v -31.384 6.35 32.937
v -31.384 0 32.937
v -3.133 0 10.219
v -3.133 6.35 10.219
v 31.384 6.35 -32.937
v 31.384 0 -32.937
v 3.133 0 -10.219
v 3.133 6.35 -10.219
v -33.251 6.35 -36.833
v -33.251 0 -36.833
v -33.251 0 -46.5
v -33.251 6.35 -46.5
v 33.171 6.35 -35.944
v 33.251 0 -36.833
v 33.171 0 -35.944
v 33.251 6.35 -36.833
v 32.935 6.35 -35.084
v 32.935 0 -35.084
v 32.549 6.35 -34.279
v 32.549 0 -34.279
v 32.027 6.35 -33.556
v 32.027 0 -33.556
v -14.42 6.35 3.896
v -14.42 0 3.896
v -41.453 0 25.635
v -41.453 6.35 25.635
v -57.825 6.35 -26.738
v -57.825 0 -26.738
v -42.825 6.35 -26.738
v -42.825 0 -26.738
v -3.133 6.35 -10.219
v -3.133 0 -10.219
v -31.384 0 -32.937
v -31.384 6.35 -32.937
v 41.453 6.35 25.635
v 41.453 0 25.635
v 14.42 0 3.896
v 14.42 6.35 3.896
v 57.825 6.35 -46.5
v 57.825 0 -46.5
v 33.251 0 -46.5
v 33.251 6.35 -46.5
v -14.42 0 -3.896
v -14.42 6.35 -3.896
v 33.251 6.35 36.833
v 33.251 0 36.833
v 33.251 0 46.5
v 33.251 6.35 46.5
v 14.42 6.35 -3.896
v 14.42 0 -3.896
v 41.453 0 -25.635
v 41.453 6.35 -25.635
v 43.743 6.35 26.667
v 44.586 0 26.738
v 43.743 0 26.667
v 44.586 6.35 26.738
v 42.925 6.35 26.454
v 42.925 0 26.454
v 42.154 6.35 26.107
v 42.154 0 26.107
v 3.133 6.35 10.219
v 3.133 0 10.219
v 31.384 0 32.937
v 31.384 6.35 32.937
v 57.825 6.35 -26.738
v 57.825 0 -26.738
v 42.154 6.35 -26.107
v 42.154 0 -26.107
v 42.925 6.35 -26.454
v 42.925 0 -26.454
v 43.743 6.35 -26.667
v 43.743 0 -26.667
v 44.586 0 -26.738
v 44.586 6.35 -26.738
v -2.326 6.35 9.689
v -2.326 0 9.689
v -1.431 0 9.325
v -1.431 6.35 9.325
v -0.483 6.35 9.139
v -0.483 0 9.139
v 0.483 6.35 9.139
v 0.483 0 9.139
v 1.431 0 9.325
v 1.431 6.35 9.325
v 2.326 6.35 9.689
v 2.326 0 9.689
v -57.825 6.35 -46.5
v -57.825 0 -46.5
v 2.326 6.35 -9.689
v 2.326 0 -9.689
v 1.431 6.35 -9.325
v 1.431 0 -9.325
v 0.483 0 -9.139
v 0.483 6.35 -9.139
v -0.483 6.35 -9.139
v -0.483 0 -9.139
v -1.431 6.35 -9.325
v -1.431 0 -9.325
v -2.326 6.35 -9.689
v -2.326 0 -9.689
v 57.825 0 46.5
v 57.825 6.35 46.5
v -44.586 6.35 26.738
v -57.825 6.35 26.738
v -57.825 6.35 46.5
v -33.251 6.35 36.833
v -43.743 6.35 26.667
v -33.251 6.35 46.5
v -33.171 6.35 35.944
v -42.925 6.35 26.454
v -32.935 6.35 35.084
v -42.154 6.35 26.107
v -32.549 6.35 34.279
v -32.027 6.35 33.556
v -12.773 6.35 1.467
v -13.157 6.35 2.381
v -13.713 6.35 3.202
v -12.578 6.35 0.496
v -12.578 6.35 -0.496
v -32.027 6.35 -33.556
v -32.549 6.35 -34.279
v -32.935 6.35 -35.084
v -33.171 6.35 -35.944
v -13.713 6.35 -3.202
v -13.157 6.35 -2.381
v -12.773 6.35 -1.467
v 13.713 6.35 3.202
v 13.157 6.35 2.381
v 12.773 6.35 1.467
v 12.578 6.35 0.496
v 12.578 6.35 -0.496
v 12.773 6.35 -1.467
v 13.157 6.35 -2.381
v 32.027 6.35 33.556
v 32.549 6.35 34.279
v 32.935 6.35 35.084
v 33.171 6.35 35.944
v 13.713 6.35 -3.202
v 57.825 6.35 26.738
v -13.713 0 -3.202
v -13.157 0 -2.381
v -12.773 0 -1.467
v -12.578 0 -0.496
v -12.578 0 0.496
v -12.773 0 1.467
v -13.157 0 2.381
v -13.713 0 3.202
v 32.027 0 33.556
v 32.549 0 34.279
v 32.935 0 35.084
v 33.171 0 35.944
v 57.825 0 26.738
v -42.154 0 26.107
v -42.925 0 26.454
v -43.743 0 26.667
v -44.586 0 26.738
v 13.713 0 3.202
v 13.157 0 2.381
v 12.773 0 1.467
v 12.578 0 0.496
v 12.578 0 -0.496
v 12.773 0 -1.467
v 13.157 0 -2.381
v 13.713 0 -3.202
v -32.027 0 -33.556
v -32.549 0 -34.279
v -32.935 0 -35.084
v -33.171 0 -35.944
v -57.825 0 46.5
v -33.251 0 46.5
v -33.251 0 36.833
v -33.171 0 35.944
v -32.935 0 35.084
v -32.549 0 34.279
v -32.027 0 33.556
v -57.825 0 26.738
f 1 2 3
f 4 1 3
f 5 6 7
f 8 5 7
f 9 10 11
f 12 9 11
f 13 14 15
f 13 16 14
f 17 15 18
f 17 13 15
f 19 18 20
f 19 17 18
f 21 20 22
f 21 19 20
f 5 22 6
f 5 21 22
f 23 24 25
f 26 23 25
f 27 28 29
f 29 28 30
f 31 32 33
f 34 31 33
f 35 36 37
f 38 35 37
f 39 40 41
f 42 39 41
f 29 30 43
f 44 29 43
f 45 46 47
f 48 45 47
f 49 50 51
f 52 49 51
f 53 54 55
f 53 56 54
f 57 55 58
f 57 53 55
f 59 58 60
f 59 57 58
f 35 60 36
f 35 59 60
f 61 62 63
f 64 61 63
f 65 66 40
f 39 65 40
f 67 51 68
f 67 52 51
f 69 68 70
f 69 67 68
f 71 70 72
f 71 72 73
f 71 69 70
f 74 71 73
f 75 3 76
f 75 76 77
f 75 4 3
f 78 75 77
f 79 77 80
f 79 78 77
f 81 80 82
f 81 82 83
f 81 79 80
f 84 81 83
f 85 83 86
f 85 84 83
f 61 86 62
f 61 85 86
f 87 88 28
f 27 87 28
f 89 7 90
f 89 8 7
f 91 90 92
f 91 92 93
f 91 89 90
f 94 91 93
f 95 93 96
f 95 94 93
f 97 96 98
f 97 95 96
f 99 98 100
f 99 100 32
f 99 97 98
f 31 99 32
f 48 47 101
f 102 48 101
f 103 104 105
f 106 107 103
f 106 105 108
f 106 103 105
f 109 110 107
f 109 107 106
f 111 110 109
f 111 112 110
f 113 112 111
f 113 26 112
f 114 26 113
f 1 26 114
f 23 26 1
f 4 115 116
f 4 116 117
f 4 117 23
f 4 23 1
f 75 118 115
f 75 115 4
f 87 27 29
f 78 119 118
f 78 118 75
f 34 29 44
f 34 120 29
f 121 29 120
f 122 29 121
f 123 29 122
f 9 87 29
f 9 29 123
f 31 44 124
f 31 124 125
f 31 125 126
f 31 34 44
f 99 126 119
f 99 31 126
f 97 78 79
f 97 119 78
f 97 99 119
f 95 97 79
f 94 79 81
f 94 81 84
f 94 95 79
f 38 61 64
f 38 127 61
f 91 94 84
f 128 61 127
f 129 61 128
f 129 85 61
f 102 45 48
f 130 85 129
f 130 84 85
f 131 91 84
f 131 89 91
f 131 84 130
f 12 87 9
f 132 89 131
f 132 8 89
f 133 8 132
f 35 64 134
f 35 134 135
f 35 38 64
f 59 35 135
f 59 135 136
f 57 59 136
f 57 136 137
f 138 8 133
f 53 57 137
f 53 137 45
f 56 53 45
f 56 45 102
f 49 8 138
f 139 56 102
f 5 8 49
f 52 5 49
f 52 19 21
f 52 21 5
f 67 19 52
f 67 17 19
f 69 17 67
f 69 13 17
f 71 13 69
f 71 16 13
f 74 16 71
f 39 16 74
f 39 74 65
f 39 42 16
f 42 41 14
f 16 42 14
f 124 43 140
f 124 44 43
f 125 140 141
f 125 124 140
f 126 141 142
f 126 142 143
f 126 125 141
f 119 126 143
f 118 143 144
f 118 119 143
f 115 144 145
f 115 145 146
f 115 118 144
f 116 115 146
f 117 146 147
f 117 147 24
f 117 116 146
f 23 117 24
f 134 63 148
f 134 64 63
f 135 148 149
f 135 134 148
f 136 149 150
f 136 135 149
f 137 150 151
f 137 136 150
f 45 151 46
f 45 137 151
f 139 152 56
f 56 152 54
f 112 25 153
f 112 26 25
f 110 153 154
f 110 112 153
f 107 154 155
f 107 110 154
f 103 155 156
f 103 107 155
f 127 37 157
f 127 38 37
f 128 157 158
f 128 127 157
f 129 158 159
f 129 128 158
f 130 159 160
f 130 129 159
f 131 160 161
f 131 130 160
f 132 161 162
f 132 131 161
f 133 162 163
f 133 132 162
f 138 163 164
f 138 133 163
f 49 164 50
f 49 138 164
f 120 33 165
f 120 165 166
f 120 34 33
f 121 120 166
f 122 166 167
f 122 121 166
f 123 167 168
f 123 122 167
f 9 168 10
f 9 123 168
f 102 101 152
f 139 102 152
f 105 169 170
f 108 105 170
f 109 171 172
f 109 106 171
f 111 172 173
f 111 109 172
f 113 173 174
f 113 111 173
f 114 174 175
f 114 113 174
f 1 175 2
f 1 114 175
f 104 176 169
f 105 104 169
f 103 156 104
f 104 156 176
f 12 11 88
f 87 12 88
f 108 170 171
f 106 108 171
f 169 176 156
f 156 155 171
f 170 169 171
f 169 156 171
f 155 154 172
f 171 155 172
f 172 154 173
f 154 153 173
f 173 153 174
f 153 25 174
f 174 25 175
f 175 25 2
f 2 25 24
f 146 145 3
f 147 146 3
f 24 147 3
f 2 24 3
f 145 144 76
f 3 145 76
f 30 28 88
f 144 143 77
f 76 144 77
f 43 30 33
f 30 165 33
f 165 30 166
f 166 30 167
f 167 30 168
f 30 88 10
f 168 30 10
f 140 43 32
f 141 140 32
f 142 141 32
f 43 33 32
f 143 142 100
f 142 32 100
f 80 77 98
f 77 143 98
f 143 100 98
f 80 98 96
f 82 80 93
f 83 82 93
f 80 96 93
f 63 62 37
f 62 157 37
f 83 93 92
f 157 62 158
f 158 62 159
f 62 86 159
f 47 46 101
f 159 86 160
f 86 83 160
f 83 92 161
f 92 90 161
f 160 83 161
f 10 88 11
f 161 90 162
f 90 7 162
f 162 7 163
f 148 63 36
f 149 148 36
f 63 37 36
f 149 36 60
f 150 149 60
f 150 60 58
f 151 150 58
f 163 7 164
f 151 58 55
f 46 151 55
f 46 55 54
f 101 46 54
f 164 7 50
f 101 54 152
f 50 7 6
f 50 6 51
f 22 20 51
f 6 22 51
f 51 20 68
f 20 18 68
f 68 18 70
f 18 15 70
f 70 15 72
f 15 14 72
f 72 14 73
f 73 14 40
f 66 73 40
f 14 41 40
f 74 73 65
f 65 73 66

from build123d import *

# Parameters (mm, degrees)
BOSS_EXTRUDE1_DEPTH = 6.35
FILLET1_R           = 5


with BuildPart() as part:
    # Sketch1 → Boss-Extrude1 (new body)
    with BuildSketch(Plane(origin=(0, 0, 0), x_dir=(1, 0, 0), z_dir=(0, 1, 0))):
        Polygon((-57.825, 26.738412941), (-42.825, 26.738412941), (-9.574489714, 0), (-42.825, -26.738412941), (-57.825, -26.738412941), (-57.825, -46.5), (-33.250510286, -46.5), (-33.250510286, -34.437743191), (0, -7.69933025), (33.250510286, -34.437743191), (33.250510286, -46.5), (57.825, -46.5), (57.825, -26.738412941), (42.825, -26.738412941), (9.574489714, 0), (42.825, 26.738412941), (57.825, 26.738412941), (57.825, 46.5), (33.250510286, 46.5), (33.250510286, 34.437743191), (0, 7.69933025), (-33.250510286, 34.437743191), (-33.250510286, 46.5), (-57.825, 46.5), align=None)
    extrude(amount=BOSS_EXTRUDE1_DEPTH)

    # Fillet1
    fillet1_edges = [part.edges().sort_by_distance(p)[0] for p in [
        (-33.250510286, 3.175, -34.437743191),
        (0, 3.175, -7.69933025),
        (33.250510286, 3.175, -34.437743191),
        (42.825, 3.175, -26.738412941),
        (9.574489714, 3.175, 0),
        (42.825, 3.175, 26.738412941),
        (33.250510286, 3.175, 34.437743191),
        (0, 3.175, 7.69933025),
        (-33.250510286, 3.175, 34.437743191),
        (-42.825, 3.175, 26.738412941),
        (-9.574489714, 3.175, 0),
    ]]
    fillet(fillet1_edges, radius=FILLET1_R)


solid = part.part
